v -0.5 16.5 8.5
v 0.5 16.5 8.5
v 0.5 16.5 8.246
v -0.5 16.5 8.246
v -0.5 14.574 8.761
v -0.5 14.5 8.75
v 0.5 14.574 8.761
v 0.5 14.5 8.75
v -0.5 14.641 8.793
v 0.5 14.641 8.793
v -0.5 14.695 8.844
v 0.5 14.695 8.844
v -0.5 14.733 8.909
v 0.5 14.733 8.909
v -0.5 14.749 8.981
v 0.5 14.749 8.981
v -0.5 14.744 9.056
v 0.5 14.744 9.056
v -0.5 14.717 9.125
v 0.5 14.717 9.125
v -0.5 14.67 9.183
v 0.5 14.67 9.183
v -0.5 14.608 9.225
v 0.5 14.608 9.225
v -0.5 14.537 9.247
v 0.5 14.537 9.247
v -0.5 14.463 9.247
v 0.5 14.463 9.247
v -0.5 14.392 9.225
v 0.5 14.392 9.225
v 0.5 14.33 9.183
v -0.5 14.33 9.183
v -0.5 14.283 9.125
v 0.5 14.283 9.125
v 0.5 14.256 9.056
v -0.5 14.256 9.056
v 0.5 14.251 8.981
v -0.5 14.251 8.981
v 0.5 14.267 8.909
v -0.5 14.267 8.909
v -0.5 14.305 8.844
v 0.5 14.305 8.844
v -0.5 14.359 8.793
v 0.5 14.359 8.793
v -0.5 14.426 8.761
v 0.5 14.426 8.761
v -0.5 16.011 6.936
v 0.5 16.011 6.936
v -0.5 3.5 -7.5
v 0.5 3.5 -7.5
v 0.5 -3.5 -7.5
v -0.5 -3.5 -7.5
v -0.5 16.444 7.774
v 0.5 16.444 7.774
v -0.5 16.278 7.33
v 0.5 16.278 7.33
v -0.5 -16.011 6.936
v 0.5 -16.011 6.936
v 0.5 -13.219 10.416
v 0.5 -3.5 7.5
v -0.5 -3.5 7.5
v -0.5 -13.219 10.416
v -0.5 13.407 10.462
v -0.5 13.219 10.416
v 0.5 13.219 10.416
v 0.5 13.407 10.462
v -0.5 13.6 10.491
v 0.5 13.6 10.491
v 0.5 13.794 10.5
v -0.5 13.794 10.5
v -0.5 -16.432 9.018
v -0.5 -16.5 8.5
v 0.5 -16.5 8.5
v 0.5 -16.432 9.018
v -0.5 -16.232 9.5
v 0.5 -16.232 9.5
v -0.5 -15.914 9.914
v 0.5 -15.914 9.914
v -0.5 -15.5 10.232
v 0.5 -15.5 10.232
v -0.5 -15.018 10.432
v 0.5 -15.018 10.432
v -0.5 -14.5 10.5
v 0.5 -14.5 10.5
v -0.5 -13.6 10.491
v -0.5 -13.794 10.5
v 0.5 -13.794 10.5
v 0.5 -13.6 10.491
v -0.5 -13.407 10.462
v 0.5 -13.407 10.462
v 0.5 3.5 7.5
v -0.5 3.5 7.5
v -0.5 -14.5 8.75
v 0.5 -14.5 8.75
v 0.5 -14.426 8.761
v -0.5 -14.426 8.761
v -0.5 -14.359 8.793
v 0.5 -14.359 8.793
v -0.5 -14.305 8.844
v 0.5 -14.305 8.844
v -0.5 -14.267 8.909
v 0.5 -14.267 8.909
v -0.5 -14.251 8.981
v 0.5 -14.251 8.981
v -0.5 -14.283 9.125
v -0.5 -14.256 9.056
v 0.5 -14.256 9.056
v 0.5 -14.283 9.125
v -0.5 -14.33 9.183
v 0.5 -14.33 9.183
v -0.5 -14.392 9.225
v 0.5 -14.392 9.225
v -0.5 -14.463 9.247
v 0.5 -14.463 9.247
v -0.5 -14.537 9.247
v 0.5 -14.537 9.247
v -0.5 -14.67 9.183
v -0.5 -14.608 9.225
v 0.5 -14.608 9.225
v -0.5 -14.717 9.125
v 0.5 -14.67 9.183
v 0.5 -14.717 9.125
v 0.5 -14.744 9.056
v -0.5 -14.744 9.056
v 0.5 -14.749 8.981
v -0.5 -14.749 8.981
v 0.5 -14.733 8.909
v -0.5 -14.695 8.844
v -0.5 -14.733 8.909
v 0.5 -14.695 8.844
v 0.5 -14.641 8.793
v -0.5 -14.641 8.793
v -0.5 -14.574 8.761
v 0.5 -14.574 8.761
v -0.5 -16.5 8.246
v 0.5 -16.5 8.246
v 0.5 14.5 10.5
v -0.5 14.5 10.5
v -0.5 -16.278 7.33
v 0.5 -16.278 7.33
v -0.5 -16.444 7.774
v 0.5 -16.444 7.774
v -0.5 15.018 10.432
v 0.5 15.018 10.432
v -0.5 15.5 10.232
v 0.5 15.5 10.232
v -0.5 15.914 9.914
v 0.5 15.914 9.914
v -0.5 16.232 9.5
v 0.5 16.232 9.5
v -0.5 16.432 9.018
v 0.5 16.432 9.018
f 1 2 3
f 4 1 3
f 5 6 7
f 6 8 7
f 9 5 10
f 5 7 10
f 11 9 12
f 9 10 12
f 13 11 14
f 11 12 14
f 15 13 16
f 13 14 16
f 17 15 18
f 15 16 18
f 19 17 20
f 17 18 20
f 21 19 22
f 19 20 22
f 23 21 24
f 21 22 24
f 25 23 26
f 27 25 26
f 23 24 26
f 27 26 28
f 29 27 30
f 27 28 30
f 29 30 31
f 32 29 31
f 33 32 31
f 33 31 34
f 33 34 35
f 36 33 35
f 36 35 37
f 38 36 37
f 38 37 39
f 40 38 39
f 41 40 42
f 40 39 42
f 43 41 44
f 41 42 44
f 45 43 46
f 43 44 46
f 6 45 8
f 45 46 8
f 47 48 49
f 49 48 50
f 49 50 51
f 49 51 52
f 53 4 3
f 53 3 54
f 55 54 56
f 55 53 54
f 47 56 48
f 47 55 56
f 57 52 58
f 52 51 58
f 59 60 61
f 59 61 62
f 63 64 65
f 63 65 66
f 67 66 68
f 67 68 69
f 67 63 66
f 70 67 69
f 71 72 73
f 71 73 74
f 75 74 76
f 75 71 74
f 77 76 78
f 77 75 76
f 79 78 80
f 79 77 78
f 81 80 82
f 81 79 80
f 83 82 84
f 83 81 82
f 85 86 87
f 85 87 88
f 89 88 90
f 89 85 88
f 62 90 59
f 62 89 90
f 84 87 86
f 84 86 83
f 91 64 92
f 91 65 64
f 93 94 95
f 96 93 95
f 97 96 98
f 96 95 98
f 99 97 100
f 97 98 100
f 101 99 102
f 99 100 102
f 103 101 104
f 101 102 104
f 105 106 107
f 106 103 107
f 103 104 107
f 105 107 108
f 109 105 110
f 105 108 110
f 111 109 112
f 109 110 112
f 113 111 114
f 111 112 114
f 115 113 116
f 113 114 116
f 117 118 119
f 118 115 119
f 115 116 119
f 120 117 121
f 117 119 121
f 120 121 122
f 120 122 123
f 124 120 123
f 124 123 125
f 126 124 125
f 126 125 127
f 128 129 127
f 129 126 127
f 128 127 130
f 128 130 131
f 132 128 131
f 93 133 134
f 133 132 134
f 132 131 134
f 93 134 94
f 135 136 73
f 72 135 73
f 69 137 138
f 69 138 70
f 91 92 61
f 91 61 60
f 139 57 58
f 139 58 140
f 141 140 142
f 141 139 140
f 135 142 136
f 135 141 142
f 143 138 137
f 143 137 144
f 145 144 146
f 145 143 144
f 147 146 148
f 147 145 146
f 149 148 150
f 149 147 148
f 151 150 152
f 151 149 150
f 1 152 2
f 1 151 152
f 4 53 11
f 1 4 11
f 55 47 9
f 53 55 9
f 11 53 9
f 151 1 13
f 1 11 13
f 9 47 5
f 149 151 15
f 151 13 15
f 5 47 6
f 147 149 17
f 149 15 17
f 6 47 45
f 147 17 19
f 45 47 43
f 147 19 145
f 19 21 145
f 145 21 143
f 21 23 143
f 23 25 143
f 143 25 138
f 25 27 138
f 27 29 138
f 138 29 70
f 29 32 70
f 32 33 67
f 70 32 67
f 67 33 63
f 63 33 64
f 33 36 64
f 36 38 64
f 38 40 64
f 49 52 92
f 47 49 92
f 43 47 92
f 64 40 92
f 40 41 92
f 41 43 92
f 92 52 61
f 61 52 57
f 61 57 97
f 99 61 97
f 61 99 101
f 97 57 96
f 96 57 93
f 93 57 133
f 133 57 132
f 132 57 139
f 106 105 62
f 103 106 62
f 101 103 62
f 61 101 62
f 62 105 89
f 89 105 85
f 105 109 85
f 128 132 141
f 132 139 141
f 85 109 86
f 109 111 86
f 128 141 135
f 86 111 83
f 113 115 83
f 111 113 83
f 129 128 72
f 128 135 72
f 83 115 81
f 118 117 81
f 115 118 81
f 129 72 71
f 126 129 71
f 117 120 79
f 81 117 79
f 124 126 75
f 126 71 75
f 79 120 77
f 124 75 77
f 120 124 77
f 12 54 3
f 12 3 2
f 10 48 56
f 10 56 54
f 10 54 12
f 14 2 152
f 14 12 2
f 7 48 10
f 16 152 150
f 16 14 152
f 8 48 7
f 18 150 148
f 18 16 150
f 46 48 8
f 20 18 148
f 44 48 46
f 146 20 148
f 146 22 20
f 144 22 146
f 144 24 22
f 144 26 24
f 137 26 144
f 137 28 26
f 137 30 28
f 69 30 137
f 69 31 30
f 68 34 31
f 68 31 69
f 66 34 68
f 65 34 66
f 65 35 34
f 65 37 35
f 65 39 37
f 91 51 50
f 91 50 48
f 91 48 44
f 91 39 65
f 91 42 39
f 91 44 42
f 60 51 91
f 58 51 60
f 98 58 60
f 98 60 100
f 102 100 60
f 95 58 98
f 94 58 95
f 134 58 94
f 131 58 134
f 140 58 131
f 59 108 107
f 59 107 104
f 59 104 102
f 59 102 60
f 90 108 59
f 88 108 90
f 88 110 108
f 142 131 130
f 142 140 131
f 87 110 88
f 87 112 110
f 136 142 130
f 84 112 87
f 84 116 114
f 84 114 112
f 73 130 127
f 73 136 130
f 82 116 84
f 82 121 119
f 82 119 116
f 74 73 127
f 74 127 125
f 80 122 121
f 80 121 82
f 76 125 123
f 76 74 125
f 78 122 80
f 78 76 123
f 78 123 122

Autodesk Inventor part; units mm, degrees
ref_plane "YZ Plane" through (0, 0, 0) normal (1, 0, 0) x (0, 1, 0)
ref_plane "XZ Plane" through (0, 0, 0) normal (0, 1, 0) x (-1, 0, 0)
ref_plane "XY Plane" through (0, 0, 0) normal (0, 0, 1) x (1, 0, 0)
sketch "スケッチ1" plane through (0, 0, 0) normal (0, 1, 0) x (-1, 0, 0)
  line L0 (-0.5, 7.5) -> (0.5, 7.5)
  line L1 (0.5, 7.5) -> (0.5, -7.5)
  line L2 (0.5, -7.5) -> (-0.5, -7.5)
  line L3 (-0.5, -7.5) -> (-0.5, 7.5)
  line L4 (-0.5, 7.5) -> (0.5, -7.5) construction
  line L5 (0.5, 7.5) -> (-0.5, -7.5) construction
  point P0 (0, 0)
  dimension "d0" = 1
  dimension "d1" = 15
extrude "押し出し1" add sketch "スケッチ1" along normal blind 3.5
sketch "スケッチ2" plane through (0.5, 0, 7.5) normal (1, 0, 0) x (0, 0, -1)
  line L0 (15, 3.5) -> (0, 3.5) projected
  line L1 (-3, 16.5) -> (0, 16.5)
  line L2 (0, 16.5) -> (15, 3.5)
  circle A0 centre (-1.5, 14.5) radius 0.25
  line L3 (-3, 16.5) -> (-3, 13.5)
  line L4 (-3, 13.5) -> (0, 3.5)
  point P0 (7.5, 0)
  point P1 (-1.5, 16.5)
  dimension "d5" = 3
  dimension "d6" = 0.5
  dimension "d7" = 2
  dimension "d11" = 13
  dimension "d12" = 3
  dimension "d13" = 3
extrude "押し出し2" add sketch "スケッチ2" against normal blind 1
fillet "フィレット1" radius 2 3 edges at (0, 16.5, 10.5) (0, 16.5, 7.5) (0, 13.5, 10.5)
mirror "ミラー1" about plane through (0, 0, 0) normal (0, -1, 0) of "押し出し2", "押し出し1", "フィレット1"
properties part number "TailHorn" material "ABS プラスチック"
